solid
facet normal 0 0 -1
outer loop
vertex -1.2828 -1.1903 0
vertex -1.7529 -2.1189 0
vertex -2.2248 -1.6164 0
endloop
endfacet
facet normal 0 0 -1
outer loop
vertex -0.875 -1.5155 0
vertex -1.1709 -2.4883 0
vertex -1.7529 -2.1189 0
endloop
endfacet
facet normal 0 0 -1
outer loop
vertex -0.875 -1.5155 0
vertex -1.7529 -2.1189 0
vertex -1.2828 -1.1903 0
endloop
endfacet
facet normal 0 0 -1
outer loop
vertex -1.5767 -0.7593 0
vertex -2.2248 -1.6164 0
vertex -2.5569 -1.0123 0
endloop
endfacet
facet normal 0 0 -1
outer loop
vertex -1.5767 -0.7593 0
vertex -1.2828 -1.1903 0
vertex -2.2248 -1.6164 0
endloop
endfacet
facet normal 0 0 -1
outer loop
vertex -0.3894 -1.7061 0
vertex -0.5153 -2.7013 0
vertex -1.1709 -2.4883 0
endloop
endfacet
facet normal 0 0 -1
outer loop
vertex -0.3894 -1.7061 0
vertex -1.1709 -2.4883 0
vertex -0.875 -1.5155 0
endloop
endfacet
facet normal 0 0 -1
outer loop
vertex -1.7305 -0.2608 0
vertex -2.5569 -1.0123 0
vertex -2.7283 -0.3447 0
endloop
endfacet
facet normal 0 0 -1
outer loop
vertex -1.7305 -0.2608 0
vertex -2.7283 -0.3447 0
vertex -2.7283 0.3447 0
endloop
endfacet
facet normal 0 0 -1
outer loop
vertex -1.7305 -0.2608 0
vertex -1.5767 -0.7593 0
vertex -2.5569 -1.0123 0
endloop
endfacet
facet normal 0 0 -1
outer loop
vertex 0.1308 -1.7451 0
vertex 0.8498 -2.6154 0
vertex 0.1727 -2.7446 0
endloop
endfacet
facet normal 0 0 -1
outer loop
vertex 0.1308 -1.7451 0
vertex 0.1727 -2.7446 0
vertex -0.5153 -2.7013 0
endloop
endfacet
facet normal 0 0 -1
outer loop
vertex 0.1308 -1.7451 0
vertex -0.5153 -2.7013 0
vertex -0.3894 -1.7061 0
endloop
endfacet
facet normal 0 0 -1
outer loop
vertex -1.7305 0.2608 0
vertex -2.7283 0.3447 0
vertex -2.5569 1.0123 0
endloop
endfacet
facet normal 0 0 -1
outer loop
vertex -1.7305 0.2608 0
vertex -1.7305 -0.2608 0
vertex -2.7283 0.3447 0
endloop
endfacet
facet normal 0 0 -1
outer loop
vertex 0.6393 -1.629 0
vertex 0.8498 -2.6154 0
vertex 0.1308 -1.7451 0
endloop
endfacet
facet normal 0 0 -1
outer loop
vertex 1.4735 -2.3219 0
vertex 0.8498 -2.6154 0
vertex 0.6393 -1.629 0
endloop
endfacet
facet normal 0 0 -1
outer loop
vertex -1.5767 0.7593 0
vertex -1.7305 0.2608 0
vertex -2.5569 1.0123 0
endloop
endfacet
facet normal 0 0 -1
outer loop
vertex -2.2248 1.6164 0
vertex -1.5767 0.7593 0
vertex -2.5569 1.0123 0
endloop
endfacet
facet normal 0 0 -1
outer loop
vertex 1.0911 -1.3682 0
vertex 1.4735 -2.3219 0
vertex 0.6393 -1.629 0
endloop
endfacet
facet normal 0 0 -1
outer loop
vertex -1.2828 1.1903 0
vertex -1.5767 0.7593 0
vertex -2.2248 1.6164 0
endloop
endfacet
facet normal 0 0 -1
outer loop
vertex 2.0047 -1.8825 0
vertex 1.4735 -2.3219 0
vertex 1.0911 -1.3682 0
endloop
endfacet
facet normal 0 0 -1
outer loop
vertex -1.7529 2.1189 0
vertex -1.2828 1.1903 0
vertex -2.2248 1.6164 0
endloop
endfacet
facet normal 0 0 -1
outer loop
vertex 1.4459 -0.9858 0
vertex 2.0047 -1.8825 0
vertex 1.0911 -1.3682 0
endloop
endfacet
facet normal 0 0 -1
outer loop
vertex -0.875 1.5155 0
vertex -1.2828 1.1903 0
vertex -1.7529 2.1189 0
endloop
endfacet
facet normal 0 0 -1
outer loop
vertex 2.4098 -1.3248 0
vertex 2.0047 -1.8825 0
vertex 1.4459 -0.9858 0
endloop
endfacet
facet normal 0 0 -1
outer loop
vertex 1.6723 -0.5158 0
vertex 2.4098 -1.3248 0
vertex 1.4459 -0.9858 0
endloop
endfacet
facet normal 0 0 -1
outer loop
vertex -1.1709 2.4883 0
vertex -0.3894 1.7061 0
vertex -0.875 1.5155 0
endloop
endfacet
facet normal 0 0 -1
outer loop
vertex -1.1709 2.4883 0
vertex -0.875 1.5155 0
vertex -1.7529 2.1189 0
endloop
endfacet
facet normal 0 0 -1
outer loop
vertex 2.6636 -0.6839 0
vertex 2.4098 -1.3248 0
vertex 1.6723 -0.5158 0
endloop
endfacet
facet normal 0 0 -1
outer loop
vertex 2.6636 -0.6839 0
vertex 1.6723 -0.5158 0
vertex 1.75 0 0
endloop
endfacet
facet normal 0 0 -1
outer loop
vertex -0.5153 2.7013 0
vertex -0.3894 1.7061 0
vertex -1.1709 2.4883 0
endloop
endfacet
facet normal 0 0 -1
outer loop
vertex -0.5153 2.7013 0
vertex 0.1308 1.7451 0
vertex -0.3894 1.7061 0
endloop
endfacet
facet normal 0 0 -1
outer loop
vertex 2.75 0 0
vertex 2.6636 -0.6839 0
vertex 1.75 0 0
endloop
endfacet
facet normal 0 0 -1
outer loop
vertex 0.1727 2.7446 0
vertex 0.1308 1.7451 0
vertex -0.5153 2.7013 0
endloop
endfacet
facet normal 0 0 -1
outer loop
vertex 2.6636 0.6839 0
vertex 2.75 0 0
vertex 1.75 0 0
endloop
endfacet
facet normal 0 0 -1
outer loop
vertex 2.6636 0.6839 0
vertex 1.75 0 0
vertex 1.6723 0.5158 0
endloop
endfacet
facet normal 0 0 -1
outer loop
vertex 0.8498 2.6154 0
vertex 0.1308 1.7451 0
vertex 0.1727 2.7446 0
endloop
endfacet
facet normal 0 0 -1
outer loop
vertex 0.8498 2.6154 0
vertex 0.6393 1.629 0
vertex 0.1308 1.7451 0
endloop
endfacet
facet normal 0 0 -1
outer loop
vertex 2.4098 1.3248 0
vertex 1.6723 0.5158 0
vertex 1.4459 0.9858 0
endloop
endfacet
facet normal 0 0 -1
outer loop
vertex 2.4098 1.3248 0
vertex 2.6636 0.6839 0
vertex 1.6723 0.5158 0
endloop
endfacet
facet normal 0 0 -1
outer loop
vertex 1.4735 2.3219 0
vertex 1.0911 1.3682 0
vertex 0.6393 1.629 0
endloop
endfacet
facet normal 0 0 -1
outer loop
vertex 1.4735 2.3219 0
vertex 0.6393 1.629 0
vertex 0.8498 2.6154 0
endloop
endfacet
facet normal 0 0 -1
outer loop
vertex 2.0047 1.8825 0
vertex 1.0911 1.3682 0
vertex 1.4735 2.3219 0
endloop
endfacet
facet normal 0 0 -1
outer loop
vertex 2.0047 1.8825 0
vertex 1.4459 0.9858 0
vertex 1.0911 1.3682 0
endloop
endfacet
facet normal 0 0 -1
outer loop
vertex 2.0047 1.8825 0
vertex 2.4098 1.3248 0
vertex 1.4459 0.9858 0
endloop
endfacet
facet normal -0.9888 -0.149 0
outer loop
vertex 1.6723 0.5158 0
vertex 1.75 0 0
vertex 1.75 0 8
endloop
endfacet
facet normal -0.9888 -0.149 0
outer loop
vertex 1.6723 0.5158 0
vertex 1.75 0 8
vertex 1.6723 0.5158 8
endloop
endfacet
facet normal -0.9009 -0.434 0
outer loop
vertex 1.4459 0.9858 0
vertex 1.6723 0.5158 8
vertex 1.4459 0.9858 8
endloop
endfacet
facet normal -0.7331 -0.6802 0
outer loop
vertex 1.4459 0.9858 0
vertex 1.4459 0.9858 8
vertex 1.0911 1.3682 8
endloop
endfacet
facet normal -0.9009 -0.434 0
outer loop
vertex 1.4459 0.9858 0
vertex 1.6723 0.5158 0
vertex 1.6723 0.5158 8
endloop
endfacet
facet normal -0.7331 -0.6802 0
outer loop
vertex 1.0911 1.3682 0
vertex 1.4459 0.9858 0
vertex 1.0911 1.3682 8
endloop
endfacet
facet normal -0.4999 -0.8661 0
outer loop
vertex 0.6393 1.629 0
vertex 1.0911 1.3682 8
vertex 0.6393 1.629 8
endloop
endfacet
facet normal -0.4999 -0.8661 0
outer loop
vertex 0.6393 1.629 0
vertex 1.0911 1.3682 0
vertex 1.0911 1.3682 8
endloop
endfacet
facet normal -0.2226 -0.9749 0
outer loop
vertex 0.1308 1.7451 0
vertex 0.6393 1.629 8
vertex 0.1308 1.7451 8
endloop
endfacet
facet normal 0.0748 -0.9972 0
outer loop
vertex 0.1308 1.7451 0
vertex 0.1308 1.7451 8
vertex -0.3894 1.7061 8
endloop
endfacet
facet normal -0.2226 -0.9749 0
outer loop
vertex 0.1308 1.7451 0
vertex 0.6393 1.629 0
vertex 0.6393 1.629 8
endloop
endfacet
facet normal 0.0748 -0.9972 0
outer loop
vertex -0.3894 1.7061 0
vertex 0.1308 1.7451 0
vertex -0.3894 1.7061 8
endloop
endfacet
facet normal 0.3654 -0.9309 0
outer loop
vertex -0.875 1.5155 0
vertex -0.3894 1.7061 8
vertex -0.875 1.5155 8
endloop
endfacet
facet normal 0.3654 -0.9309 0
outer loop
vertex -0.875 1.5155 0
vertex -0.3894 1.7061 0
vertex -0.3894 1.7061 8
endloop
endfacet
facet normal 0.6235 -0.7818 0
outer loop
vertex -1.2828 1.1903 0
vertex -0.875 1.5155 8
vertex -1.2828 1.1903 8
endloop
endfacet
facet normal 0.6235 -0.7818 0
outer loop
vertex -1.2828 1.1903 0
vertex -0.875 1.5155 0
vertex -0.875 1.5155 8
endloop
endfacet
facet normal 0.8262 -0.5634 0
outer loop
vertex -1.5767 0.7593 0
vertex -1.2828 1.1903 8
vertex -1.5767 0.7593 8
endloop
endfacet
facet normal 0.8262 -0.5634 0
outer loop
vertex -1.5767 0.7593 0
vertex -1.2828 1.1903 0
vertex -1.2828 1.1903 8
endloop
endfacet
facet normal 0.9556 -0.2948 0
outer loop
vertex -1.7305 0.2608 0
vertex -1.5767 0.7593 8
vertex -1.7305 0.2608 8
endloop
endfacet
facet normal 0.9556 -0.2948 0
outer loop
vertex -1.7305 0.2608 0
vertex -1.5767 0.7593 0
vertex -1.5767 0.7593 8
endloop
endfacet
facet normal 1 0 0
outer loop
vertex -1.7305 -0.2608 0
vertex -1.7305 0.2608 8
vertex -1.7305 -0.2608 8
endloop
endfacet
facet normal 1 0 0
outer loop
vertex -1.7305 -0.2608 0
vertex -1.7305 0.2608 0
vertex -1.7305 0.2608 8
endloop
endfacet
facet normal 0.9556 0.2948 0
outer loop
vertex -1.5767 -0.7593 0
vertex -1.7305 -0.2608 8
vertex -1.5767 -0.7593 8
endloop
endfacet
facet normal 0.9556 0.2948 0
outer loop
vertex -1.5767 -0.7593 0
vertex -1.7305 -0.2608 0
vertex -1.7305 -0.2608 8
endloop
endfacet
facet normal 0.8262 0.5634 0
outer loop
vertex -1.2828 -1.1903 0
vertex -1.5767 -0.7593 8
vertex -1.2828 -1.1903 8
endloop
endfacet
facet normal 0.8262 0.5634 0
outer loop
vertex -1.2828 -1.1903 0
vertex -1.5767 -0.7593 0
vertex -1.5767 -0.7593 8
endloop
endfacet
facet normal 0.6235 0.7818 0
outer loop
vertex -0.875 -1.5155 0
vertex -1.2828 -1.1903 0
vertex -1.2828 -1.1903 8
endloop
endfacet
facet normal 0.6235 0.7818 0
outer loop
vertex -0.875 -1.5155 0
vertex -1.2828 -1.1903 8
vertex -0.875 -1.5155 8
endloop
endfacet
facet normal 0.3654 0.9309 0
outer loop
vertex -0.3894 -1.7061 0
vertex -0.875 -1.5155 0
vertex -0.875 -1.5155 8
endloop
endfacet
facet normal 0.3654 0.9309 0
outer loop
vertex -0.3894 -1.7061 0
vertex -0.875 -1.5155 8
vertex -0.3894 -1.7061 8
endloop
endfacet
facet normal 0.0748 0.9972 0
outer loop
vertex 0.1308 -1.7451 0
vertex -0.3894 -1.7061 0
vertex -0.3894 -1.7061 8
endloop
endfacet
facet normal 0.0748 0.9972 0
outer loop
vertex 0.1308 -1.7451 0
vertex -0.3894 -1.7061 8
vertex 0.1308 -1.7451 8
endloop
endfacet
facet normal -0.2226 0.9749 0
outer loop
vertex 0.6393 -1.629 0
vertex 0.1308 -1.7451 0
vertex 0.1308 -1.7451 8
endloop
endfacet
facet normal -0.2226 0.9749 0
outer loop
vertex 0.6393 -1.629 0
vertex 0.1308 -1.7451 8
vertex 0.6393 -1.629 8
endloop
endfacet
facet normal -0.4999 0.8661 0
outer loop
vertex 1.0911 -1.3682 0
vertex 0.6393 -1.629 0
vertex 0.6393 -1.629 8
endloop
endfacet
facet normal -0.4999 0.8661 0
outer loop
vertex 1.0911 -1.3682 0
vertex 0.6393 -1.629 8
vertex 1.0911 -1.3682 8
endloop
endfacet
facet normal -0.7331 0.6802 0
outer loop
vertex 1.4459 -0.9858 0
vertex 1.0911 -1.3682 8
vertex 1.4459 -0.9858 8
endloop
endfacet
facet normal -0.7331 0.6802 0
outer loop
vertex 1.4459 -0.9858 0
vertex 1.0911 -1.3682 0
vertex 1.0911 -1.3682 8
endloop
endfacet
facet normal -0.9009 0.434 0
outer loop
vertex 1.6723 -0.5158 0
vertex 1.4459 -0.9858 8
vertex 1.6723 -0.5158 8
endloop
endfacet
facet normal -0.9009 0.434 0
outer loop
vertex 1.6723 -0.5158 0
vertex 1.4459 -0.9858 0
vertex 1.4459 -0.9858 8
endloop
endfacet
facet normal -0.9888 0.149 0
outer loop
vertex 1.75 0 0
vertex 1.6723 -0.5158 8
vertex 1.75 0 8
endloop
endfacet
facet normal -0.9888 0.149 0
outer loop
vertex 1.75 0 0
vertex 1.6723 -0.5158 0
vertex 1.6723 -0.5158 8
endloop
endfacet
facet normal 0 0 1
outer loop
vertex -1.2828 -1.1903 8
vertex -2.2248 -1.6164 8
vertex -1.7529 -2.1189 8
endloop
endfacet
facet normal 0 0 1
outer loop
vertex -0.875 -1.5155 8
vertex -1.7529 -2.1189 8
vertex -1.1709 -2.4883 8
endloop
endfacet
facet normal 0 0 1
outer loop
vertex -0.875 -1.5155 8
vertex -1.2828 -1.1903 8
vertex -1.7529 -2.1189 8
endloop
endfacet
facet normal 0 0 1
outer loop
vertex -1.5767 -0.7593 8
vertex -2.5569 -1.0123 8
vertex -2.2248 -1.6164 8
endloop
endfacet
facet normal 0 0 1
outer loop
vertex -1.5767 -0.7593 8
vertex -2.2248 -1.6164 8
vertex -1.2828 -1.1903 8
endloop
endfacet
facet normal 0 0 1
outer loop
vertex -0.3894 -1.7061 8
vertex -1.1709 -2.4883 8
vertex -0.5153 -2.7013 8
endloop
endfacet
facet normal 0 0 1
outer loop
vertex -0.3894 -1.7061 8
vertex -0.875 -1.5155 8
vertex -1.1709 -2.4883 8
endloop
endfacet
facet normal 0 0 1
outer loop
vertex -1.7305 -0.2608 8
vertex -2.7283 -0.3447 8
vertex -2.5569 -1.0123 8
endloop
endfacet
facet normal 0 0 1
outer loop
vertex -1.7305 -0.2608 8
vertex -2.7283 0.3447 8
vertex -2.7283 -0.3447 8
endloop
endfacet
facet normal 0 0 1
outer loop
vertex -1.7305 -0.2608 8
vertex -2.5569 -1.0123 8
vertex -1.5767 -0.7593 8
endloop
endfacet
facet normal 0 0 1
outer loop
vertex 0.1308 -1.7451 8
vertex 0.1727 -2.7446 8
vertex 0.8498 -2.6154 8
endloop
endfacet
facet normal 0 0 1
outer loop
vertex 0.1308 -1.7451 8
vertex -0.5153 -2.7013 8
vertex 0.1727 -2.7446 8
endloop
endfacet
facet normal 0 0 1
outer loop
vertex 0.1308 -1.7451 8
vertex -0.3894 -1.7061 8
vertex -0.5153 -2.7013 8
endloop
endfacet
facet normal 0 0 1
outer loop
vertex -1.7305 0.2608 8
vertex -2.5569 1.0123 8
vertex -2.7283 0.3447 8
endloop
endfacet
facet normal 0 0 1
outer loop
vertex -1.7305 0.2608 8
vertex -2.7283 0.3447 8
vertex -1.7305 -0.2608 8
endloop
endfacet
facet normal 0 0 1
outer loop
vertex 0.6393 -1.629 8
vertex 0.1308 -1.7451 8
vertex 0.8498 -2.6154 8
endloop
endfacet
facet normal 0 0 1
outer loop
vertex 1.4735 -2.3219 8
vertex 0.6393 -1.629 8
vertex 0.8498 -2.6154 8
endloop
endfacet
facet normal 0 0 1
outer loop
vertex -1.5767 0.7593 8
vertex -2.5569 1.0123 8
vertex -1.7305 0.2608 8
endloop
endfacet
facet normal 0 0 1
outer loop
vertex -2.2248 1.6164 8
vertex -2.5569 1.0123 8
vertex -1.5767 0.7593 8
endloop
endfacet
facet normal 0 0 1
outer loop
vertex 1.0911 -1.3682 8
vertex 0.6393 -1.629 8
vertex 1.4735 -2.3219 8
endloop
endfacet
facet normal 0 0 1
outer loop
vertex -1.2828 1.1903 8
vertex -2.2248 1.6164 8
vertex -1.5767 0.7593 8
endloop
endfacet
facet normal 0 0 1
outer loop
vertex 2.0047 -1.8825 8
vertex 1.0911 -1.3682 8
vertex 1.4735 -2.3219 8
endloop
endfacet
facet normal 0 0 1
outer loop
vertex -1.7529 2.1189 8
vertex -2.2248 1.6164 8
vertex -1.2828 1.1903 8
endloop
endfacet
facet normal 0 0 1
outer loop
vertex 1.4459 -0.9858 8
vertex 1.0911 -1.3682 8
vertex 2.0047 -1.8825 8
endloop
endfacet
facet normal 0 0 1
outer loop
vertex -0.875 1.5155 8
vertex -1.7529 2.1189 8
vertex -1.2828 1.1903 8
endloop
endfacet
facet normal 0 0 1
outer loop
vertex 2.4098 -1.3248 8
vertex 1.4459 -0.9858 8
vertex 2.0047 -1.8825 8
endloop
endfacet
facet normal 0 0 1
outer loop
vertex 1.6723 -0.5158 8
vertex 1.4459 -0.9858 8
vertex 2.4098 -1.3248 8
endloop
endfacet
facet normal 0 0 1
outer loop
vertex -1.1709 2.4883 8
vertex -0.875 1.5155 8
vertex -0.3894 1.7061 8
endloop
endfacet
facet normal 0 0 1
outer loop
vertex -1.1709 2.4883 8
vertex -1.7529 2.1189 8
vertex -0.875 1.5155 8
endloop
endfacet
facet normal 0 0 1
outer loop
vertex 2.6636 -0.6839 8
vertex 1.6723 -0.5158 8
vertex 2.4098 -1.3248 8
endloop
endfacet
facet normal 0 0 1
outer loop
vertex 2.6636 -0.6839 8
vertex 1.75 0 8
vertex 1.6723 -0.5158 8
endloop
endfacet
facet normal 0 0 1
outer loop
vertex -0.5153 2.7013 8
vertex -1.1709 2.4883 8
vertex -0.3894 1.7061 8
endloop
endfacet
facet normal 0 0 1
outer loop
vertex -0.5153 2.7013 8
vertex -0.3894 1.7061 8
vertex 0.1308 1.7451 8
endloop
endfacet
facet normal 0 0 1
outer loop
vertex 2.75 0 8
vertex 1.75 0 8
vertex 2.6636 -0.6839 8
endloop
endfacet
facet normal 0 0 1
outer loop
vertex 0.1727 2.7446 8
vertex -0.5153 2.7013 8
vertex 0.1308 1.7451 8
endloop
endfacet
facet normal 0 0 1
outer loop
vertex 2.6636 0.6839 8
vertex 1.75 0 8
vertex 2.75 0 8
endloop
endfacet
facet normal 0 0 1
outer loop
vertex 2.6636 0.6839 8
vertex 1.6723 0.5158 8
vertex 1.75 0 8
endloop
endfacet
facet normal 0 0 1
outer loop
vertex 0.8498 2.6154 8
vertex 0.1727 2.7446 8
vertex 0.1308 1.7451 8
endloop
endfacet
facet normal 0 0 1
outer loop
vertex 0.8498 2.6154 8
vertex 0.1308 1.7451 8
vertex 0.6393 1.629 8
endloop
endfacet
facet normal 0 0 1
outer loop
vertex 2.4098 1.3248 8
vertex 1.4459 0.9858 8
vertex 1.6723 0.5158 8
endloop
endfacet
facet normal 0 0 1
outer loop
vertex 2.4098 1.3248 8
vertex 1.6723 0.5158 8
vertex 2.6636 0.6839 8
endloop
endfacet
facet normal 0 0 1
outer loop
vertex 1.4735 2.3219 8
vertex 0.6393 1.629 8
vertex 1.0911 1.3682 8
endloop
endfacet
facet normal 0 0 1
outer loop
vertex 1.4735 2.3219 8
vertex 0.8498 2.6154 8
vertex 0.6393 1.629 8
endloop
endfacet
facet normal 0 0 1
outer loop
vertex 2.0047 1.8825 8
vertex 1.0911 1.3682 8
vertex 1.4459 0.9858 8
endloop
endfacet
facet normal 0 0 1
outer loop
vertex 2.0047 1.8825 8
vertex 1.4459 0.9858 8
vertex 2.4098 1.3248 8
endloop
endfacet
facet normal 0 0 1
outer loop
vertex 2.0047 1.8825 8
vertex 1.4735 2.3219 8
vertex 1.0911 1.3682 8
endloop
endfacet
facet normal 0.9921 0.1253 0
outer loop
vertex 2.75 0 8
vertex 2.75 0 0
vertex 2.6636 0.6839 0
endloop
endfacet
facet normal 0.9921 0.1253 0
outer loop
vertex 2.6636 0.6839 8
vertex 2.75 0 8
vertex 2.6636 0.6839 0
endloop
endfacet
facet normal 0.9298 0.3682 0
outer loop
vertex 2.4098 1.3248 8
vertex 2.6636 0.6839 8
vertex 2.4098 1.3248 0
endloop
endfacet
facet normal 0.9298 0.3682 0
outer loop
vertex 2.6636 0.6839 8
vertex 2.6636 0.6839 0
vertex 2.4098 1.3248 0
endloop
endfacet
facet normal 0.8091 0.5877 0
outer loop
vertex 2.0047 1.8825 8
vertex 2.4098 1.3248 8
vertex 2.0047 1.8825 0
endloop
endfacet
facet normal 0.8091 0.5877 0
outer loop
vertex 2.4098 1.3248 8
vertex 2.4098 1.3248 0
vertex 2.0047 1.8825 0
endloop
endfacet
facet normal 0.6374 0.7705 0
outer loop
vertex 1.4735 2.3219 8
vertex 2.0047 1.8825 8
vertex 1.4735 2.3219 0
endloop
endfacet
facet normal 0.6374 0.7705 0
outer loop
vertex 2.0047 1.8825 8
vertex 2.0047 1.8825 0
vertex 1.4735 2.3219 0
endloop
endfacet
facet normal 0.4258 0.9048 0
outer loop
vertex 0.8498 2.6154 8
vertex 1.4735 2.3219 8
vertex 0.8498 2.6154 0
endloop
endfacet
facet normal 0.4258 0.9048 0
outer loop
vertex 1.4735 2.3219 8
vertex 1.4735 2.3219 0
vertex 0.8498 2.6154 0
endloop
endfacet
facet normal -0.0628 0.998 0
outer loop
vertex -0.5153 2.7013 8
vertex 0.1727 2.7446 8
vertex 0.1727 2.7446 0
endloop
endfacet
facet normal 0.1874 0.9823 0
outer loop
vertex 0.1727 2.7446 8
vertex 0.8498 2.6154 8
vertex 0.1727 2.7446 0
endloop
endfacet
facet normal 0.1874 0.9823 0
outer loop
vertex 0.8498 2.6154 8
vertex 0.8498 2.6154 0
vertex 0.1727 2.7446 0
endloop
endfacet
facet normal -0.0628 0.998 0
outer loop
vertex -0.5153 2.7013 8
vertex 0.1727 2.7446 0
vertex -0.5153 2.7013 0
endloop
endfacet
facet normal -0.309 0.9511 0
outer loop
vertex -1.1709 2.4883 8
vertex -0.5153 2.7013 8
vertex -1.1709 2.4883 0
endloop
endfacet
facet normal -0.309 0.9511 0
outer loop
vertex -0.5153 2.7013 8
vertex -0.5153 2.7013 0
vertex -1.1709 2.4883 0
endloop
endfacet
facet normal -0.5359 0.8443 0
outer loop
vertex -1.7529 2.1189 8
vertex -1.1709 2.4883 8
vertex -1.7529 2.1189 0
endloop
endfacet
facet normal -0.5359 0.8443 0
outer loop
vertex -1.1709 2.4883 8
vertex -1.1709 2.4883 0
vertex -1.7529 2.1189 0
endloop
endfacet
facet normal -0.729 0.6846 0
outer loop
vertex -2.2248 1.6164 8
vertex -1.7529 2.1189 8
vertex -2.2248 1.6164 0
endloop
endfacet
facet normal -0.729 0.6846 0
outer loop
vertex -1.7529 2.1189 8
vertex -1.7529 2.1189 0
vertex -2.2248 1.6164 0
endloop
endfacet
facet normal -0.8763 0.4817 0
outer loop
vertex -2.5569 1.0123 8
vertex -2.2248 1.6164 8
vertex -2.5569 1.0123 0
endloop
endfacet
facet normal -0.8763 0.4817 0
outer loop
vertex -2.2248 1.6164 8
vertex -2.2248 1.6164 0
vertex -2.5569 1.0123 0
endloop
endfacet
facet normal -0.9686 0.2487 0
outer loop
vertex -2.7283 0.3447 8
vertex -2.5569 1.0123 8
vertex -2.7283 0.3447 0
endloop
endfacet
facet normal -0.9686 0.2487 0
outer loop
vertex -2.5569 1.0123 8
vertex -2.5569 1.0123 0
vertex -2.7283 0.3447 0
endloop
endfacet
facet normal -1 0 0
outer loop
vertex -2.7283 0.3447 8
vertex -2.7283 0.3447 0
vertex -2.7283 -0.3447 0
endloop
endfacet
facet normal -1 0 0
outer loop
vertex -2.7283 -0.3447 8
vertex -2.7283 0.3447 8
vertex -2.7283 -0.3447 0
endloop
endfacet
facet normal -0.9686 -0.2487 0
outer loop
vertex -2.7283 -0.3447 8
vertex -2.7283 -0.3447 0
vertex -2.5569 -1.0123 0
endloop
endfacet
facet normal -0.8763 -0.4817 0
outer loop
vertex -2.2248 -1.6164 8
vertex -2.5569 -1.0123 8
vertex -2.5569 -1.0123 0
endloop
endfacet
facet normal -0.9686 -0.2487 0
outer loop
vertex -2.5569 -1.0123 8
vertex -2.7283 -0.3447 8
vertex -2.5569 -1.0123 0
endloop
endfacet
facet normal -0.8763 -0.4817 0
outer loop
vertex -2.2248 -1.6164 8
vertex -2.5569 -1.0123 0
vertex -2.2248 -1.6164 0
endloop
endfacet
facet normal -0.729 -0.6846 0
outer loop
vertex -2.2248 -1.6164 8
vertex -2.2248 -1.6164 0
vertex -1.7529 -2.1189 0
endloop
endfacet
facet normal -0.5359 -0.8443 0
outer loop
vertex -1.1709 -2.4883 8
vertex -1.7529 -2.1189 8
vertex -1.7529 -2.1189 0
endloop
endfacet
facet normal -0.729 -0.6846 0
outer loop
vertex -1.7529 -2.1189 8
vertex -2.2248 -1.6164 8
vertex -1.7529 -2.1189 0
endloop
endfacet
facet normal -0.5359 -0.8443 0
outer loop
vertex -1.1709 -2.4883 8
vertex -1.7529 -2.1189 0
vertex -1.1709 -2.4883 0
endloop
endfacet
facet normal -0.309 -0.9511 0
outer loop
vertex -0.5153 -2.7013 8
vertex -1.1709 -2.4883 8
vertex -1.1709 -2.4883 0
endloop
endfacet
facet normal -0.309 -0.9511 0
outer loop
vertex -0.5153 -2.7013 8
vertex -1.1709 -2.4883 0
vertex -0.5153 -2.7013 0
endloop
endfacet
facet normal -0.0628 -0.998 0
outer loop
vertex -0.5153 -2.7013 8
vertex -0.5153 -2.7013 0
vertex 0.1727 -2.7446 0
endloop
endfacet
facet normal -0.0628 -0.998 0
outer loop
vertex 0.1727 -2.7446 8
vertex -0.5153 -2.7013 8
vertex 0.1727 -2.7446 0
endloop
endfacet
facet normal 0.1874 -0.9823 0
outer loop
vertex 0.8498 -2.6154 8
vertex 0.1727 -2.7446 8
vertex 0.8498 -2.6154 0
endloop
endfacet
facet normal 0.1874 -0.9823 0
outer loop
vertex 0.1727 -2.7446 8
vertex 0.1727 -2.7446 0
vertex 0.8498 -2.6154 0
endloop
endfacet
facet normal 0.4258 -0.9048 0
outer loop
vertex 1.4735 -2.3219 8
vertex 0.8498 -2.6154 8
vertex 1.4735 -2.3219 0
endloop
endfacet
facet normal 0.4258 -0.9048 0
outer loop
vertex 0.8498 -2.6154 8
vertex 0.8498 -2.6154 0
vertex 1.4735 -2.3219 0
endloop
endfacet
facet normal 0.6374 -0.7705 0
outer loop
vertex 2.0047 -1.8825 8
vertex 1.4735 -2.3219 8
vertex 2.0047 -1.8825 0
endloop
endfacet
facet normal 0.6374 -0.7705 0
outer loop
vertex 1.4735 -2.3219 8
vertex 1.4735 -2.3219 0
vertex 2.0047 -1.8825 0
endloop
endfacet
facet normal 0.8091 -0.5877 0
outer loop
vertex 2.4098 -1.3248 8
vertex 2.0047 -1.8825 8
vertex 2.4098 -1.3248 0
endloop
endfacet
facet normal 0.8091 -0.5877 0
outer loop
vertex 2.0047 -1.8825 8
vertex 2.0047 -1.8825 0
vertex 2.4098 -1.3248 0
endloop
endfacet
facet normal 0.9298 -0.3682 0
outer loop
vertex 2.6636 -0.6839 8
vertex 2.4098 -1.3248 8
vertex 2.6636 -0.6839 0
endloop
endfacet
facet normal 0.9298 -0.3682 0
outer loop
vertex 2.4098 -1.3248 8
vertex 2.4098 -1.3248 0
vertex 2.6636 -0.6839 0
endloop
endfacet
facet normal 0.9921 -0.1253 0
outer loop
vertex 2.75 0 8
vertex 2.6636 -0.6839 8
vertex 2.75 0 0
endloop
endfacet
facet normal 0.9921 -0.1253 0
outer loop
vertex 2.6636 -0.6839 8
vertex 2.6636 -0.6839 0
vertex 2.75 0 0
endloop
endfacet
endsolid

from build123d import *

# Parameters (mm, degrees)
SKETCH_R       = 1.75
PAD_DEPTH      = 8
THICKNESS001_T = 1
SKETCH013_W    = 12.495425
SKETCH013_H    = 4.952306
POCKET_DEPTH   = 6.751


with BuildPart() as part:
    # Sketch → Pad (new body)
    with BuildSketch(Plane.XY):
        Circle(SKETCH_R)
    extrude(amount=PAD_DEPTH)

    # Thickness001
    thickness001_openings = [part.faces().sort_by_distance(p)[0] for p in [
        (0, 0, 8),
    ]]
    offset(amount=THICKNESS001_T, openings=thickness001_openings, kind=Kind.INTERSECTION)

    # Sketch013 → Pocket (cut, through all)
    with BuildSketch(Plane.YZ.offset(4)):
        with Locations((0.810456, -2.476153)):
            Rectangle(SKETCH013_W, SKETCH013_H)
    extrude(amount=-POCKET_DEPTH, mode=Mode.SUBTRACT)


solid = part.part
